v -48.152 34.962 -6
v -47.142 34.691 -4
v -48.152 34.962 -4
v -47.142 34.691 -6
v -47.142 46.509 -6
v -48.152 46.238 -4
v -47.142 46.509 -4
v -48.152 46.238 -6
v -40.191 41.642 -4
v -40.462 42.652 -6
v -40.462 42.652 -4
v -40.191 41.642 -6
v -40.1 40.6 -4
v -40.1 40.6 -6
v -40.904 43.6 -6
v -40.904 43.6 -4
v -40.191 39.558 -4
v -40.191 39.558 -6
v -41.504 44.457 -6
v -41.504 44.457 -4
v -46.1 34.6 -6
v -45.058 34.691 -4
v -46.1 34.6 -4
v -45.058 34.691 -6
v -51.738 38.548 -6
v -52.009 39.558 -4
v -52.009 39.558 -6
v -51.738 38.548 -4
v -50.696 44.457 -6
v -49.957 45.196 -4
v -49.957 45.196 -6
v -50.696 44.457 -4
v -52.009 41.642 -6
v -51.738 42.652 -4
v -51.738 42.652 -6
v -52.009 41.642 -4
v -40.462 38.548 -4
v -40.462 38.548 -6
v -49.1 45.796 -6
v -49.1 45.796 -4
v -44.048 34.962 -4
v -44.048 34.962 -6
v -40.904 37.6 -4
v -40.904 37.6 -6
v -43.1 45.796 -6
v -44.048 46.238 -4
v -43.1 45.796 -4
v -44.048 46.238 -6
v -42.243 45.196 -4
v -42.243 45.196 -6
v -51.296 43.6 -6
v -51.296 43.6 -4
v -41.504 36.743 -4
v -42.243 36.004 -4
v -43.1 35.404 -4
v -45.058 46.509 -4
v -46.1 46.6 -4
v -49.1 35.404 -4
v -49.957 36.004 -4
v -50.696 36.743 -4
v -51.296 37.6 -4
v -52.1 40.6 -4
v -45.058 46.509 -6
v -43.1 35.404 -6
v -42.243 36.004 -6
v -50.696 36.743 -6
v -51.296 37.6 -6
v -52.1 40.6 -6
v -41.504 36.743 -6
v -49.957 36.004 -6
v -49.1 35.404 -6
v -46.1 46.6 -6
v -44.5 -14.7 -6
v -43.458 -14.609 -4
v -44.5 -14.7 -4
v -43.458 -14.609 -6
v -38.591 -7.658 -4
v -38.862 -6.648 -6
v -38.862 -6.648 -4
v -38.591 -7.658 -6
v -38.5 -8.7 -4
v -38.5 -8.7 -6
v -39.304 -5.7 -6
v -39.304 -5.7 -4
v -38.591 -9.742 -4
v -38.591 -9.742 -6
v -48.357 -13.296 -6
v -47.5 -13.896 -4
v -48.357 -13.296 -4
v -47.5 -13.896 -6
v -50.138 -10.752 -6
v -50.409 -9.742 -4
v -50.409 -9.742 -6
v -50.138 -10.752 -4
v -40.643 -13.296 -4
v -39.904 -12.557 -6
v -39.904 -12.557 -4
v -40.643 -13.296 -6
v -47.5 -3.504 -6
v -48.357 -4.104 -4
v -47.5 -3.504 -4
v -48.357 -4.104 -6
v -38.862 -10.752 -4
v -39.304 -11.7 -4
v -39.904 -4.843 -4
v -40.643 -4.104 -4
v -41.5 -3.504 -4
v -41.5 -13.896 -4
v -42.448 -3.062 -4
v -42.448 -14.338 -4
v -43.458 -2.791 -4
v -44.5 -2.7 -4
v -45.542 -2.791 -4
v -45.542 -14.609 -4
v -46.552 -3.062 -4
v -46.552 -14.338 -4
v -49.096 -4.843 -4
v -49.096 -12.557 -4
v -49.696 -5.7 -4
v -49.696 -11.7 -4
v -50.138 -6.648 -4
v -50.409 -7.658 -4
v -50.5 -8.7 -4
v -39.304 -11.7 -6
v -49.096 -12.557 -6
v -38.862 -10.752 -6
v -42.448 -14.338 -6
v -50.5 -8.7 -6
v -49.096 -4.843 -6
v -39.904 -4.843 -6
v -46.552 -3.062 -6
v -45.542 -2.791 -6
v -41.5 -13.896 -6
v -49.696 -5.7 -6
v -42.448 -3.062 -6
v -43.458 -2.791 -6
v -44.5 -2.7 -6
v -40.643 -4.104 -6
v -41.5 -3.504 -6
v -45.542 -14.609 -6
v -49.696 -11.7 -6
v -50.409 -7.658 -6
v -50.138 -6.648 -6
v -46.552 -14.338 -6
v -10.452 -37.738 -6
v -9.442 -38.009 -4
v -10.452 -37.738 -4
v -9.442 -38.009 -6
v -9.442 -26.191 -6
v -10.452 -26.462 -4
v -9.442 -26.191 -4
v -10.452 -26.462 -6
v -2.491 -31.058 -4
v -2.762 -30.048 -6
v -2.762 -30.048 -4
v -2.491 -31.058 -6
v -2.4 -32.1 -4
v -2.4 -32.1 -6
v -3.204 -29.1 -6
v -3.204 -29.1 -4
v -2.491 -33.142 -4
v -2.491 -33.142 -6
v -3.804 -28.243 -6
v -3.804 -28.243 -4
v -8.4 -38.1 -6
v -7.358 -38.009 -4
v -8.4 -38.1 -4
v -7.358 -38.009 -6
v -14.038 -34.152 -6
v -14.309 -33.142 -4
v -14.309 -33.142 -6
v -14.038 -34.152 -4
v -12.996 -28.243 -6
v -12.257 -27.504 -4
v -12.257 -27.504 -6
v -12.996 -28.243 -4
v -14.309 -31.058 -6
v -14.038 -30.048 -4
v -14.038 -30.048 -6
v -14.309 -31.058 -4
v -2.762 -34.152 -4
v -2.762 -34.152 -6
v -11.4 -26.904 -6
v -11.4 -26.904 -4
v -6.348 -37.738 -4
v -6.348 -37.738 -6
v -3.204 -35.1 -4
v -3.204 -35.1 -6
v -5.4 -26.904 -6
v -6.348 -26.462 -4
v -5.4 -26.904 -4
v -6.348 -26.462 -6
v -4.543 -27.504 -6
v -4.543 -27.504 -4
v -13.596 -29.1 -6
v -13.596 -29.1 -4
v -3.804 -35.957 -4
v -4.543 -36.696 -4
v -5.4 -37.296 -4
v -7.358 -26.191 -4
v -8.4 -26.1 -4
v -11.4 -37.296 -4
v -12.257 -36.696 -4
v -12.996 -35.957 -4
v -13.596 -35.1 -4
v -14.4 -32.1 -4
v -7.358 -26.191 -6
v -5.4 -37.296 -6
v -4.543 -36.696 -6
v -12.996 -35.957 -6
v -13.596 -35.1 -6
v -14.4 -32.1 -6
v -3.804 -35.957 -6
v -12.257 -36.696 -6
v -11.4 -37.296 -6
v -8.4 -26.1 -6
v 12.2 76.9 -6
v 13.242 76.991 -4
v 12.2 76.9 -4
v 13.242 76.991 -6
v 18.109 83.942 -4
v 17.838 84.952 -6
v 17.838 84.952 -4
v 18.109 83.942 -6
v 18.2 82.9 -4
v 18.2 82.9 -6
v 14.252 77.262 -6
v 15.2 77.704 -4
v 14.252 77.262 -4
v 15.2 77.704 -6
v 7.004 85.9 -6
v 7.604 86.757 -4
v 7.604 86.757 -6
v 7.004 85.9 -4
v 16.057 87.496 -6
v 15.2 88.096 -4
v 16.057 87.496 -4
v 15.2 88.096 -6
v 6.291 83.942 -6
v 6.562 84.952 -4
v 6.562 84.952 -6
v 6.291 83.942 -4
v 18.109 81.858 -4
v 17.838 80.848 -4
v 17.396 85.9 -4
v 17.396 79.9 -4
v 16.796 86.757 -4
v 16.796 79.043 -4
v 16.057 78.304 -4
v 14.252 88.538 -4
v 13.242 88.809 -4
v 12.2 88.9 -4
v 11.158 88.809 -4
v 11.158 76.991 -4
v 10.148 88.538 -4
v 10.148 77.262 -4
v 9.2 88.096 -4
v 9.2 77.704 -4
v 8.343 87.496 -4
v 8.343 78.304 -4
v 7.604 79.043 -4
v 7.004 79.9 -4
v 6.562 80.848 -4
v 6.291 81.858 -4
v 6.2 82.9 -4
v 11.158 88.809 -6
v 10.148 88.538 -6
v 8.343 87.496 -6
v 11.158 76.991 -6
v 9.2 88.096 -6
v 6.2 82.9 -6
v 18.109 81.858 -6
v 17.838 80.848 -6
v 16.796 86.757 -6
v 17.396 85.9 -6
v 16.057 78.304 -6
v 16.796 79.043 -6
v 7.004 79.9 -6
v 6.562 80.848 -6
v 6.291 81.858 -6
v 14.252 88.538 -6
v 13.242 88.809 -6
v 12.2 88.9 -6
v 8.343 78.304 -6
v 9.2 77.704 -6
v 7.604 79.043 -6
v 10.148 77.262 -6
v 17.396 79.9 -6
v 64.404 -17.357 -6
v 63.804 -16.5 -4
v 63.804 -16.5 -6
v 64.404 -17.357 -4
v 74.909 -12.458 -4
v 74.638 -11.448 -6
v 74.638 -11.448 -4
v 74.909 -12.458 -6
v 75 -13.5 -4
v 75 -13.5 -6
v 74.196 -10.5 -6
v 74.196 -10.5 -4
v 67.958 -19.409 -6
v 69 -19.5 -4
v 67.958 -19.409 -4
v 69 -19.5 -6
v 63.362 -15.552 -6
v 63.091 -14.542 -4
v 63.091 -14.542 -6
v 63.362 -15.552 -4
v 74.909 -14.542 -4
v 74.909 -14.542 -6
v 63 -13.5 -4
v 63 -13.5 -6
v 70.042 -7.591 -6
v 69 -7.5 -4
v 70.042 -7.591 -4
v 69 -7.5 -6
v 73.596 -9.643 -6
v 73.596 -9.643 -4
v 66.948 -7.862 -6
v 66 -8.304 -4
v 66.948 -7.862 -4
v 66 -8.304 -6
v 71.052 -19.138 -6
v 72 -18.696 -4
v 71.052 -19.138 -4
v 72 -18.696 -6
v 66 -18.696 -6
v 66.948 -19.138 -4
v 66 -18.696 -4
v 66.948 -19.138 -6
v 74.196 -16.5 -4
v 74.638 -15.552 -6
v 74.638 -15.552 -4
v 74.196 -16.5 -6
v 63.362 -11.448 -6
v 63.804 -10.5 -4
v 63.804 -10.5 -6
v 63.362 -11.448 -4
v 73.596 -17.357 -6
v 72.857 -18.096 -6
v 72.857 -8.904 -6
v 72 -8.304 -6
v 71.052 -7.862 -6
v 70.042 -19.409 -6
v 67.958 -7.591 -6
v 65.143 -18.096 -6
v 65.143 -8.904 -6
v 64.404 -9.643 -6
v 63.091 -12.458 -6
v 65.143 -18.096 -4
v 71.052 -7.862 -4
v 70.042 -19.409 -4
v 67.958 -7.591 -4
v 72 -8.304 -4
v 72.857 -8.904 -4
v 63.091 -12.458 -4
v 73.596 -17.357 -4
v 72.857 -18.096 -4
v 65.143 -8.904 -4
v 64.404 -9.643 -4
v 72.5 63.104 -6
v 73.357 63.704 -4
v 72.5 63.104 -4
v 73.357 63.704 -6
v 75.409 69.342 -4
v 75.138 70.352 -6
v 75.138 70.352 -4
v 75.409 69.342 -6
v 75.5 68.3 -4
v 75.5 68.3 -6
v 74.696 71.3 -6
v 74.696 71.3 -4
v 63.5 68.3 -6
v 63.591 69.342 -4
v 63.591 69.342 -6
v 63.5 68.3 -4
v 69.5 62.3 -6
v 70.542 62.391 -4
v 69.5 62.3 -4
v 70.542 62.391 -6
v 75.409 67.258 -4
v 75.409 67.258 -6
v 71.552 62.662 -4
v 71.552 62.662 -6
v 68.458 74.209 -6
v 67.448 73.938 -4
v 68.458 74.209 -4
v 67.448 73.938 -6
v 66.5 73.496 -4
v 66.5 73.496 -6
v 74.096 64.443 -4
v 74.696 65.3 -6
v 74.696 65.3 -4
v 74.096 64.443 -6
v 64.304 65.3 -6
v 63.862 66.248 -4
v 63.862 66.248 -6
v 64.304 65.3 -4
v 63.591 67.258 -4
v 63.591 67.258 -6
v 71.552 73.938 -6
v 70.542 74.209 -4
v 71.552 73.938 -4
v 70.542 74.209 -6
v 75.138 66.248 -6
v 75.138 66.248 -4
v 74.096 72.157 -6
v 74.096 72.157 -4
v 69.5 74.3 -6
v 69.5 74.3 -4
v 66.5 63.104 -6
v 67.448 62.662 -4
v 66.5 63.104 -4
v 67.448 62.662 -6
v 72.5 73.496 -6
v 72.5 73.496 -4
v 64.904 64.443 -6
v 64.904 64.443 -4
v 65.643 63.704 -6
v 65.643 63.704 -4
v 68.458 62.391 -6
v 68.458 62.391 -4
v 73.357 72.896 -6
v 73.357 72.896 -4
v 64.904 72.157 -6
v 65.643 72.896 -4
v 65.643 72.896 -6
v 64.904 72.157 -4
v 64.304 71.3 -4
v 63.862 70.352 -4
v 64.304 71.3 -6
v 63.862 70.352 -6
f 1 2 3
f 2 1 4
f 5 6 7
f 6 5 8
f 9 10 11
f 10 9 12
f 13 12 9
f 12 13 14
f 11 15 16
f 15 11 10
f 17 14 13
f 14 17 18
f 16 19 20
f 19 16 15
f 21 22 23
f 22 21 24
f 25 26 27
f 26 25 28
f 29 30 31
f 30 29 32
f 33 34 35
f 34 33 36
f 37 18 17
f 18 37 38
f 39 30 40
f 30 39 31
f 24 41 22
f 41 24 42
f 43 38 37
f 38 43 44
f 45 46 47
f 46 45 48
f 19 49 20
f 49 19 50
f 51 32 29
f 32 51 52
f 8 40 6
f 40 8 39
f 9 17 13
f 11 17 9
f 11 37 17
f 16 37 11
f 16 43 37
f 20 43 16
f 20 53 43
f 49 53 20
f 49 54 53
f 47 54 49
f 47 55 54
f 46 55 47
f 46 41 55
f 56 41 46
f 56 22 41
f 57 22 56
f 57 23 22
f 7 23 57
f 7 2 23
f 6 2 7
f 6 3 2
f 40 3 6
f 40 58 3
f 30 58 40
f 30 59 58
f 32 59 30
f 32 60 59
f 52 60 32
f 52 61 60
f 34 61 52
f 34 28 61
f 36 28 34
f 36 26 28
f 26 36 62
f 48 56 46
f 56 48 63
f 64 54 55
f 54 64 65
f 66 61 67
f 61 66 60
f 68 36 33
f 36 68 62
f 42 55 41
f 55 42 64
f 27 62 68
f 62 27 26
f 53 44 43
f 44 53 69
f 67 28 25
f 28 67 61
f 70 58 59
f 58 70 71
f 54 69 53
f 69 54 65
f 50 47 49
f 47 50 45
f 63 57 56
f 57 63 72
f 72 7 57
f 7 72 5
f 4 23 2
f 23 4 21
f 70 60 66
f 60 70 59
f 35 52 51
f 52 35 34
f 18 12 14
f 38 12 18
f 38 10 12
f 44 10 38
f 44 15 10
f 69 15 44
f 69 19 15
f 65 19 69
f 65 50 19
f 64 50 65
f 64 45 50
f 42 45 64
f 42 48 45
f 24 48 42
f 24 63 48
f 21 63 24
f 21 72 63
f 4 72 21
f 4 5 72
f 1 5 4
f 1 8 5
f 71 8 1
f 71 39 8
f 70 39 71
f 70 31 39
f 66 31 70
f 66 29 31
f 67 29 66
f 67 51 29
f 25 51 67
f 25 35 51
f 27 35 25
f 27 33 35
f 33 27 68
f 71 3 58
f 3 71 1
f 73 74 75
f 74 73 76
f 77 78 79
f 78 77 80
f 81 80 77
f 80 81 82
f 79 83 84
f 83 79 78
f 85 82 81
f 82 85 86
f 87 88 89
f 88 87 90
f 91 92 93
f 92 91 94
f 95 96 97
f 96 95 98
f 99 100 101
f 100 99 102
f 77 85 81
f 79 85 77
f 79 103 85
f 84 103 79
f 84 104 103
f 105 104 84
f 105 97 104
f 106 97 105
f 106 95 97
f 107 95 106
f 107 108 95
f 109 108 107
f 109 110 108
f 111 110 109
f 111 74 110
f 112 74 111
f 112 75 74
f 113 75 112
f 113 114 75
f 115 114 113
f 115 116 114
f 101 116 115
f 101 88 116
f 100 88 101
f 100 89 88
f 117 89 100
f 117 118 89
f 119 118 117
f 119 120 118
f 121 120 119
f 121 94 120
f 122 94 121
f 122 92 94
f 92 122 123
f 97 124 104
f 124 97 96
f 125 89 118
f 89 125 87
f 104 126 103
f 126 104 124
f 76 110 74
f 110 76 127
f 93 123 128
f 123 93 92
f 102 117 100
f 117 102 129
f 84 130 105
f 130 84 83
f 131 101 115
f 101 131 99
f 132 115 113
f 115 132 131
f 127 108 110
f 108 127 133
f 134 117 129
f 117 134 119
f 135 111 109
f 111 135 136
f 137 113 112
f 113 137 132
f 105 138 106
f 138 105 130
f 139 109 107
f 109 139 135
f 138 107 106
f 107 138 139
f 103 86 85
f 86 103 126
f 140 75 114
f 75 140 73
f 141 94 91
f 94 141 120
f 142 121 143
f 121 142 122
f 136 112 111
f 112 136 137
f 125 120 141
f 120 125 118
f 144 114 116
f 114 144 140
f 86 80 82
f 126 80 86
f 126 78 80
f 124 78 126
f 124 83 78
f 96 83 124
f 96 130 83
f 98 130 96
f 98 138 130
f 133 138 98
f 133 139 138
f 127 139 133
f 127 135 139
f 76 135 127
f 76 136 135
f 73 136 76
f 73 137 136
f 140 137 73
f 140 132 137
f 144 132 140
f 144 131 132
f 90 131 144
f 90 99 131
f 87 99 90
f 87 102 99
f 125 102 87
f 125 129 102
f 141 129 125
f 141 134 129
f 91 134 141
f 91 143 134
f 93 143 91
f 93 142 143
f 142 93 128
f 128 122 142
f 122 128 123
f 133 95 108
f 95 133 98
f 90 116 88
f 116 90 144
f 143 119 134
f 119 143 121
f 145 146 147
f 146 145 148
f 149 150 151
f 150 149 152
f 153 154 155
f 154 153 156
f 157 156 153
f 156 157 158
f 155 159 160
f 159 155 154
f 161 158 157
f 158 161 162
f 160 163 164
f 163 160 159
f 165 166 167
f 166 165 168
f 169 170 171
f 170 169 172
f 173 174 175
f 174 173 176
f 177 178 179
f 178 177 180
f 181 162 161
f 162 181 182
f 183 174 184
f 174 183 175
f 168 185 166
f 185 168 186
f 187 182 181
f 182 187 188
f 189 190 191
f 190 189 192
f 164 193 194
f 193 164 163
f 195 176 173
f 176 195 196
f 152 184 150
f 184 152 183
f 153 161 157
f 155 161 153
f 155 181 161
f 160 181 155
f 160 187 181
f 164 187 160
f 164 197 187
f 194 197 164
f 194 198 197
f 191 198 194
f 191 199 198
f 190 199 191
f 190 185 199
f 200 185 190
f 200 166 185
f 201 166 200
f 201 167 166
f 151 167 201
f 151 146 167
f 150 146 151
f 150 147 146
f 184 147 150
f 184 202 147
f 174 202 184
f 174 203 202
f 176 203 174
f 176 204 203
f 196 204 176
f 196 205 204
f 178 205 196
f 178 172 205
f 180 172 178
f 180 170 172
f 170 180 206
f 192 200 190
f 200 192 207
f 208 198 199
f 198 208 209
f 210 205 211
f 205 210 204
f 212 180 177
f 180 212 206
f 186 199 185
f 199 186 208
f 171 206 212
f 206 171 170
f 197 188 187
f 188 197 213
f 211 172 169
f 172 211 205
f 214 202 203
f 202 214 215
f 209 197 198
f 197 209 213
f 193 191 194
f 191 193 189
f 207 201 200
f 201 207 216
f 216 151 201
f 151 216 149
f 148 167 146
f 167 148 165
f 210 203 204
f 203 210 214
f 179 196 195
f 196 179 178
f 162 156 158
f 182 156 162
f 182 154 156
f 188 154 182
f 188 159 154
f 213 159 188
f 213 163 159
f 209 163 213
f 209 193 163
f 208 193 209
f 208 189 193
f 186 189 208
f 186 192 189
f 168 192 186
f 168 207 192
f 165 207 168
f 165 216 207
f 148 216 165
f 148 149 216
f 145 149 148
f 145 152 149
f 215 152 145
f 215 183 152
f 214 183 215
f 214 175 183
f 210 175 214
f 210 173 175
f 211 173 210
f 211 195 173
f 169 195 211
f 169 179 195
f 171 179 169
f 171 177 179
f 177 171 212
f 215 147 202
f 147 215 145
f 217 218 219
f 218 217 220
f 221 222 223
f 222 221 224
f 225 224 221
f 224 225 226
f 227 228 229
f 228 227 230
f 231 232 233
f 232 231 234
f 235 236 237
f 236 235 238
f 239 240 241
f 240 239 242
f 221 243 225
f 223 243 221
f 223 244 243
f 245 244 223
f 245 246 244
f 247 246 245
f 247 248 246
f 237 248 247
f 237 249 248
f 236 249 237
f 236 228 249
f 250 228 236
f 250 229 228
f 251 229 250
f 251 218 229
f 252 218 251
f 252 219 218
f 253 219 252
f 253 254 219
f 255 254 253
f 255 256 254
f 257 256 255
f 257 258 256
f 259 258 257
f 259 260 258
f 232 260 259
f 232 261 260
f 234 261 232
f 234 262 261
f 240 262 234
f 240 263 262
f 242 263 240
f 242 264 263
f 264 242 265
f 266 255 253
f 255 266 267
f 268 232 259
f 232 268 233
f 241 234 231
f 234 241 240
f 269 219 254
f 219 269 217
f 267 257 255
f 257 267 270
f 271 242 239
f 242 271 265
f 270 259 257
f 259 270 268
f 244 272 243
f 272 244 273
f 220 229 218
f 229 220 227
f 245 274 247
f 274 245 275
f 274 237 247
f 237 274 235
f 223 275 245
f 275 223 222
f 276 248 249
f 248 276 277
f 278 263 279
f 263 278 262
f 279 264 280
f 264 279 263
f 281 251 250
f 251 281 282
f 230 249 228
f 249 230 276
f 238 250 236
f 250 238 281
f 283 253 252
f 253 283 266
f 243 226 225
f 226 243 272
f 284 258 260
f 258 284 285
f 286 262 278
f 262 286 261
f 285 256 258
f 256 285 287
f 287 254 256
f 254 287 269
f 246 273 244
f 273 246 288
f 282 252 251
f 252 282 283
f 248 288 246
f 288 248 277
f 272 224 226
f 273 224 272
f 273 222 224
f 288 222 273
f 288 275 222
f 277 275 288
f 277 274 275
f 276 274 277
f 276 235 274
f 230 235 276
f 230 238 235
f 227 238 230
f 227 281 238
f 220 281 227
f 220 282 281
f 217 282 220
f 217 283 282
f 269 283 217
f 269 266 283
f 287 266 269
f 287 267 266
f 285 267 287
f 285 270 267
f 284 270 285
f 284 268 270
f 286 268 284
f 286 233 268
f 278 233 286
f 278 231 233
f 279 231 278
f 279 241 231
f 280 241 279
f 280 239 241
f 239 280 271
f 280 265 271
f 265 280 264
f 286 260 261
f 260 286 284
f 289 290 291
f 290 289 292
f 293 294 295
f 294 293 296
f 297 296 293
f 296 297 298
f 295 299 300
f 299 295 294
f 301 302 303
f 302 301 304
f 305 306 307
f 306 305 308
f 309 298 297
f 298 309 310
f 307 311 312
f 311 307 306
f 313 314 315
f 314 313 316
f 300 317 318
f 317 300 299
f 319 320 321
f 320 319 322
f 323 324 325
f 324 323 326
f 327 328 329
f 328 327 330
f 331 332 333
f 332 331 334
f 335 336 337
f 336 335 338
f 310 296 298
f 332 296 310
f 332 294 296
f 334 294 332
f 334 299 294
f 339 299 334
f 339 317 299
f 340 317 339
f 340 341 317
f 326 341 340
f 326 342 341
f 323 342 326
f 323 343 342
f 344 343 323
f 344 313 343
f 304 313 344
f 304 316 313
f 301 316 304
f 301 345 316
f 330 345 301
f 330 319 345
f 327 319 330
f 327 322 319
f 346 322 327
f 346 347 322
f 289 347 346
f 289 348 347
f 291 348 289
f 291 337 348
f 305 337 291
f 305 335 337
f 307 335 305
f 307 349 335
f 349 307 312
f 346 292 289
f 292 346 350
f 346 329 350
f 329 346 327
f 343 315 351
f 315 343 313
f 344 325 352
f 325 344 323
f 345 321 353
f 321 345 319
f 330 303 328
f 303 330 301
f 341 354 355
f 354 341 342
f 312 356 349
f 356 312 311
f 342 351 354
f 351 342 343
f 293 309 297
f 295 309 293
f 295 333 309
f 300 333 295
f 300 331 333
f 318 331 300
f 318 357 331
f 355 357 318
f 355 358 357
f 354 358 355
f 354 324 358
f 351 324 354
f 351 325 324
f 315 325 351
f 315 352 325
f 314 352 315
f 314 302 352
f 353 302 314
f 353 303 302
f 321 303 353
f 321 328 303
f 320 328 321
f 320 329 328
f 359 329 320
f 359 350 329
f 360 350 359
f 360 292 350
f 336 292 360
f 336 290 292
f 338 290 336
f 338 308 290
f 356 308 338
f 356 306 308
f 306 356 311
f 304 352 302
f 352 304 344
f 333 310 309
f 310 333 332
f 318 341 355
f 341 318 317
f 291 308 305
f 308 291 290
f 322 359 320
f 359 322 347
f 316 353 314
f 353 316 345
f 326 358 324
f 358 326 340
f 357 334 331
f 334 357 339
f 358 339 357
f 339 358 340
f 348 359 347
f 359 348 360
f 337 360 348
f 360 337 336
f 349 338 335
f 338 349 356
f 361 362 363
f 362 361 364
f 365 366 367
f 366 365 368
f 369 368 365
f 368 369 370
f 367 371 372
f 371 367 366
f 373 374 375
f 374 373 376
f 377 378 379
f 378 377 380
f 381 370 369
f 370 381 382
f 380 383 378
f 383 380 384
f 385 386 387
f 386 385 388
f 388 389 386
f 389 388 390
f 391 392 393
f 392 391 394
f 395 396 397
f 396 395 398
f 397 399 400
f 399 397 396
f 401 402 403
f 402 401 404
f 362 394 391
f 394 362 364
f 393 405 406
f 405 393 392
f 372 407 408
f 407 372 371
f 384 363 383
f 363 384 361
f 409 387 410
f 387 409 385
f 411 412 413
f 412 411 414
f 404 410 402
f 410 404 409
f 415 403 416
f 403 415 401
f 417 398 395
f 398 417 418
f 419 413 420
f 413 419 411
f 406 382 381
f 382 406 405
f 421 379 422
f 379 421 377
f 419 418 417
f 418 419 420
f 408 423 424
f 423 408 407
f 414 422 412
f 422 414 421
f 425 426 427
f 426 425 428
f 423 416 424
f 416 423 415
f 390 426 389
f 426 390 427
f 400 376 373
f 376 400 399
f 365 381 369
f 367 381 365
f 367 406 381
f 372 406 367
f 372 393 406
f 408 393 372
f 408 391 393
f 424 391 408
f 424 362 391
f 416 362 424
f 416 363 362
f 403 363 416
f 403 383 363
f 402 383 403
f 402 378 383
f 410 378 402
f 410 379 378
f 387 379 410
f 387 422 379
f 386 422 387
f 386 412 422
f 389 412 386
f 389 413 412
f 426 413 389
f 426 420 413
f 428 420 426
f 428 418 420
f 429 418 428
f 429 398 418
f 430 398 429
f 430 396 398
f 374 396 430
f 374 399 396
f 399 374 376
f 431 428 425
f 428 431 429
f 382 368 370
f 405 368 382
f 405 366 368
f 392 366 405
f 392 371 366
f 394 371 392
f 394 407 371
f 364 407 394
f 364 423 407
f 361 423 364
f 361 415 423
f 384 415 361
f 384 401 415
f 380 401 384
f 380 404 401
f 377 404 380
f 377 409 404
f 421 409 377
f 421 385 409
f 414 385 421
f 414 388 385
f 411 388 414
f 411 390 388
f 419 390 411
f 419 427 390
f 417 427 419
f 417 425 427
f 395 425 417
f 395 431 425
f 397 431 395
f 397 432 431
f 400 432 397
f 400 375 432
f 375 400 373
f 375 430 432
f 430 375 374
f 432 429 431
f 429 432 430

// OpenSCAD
PTS=[[134.9-181,40.6],[136.5-181,-8.7],[172.6-181,-32.1],[193.2-181,82.9],[250.0-181,-13.5],[250.5-181,68.3]];
for(p=PTS) translate([p[0],p[1],-5]) cylinder(h=2,d=12,center=true,$fn=36);   // on tent-top plate (z -6..-4)
